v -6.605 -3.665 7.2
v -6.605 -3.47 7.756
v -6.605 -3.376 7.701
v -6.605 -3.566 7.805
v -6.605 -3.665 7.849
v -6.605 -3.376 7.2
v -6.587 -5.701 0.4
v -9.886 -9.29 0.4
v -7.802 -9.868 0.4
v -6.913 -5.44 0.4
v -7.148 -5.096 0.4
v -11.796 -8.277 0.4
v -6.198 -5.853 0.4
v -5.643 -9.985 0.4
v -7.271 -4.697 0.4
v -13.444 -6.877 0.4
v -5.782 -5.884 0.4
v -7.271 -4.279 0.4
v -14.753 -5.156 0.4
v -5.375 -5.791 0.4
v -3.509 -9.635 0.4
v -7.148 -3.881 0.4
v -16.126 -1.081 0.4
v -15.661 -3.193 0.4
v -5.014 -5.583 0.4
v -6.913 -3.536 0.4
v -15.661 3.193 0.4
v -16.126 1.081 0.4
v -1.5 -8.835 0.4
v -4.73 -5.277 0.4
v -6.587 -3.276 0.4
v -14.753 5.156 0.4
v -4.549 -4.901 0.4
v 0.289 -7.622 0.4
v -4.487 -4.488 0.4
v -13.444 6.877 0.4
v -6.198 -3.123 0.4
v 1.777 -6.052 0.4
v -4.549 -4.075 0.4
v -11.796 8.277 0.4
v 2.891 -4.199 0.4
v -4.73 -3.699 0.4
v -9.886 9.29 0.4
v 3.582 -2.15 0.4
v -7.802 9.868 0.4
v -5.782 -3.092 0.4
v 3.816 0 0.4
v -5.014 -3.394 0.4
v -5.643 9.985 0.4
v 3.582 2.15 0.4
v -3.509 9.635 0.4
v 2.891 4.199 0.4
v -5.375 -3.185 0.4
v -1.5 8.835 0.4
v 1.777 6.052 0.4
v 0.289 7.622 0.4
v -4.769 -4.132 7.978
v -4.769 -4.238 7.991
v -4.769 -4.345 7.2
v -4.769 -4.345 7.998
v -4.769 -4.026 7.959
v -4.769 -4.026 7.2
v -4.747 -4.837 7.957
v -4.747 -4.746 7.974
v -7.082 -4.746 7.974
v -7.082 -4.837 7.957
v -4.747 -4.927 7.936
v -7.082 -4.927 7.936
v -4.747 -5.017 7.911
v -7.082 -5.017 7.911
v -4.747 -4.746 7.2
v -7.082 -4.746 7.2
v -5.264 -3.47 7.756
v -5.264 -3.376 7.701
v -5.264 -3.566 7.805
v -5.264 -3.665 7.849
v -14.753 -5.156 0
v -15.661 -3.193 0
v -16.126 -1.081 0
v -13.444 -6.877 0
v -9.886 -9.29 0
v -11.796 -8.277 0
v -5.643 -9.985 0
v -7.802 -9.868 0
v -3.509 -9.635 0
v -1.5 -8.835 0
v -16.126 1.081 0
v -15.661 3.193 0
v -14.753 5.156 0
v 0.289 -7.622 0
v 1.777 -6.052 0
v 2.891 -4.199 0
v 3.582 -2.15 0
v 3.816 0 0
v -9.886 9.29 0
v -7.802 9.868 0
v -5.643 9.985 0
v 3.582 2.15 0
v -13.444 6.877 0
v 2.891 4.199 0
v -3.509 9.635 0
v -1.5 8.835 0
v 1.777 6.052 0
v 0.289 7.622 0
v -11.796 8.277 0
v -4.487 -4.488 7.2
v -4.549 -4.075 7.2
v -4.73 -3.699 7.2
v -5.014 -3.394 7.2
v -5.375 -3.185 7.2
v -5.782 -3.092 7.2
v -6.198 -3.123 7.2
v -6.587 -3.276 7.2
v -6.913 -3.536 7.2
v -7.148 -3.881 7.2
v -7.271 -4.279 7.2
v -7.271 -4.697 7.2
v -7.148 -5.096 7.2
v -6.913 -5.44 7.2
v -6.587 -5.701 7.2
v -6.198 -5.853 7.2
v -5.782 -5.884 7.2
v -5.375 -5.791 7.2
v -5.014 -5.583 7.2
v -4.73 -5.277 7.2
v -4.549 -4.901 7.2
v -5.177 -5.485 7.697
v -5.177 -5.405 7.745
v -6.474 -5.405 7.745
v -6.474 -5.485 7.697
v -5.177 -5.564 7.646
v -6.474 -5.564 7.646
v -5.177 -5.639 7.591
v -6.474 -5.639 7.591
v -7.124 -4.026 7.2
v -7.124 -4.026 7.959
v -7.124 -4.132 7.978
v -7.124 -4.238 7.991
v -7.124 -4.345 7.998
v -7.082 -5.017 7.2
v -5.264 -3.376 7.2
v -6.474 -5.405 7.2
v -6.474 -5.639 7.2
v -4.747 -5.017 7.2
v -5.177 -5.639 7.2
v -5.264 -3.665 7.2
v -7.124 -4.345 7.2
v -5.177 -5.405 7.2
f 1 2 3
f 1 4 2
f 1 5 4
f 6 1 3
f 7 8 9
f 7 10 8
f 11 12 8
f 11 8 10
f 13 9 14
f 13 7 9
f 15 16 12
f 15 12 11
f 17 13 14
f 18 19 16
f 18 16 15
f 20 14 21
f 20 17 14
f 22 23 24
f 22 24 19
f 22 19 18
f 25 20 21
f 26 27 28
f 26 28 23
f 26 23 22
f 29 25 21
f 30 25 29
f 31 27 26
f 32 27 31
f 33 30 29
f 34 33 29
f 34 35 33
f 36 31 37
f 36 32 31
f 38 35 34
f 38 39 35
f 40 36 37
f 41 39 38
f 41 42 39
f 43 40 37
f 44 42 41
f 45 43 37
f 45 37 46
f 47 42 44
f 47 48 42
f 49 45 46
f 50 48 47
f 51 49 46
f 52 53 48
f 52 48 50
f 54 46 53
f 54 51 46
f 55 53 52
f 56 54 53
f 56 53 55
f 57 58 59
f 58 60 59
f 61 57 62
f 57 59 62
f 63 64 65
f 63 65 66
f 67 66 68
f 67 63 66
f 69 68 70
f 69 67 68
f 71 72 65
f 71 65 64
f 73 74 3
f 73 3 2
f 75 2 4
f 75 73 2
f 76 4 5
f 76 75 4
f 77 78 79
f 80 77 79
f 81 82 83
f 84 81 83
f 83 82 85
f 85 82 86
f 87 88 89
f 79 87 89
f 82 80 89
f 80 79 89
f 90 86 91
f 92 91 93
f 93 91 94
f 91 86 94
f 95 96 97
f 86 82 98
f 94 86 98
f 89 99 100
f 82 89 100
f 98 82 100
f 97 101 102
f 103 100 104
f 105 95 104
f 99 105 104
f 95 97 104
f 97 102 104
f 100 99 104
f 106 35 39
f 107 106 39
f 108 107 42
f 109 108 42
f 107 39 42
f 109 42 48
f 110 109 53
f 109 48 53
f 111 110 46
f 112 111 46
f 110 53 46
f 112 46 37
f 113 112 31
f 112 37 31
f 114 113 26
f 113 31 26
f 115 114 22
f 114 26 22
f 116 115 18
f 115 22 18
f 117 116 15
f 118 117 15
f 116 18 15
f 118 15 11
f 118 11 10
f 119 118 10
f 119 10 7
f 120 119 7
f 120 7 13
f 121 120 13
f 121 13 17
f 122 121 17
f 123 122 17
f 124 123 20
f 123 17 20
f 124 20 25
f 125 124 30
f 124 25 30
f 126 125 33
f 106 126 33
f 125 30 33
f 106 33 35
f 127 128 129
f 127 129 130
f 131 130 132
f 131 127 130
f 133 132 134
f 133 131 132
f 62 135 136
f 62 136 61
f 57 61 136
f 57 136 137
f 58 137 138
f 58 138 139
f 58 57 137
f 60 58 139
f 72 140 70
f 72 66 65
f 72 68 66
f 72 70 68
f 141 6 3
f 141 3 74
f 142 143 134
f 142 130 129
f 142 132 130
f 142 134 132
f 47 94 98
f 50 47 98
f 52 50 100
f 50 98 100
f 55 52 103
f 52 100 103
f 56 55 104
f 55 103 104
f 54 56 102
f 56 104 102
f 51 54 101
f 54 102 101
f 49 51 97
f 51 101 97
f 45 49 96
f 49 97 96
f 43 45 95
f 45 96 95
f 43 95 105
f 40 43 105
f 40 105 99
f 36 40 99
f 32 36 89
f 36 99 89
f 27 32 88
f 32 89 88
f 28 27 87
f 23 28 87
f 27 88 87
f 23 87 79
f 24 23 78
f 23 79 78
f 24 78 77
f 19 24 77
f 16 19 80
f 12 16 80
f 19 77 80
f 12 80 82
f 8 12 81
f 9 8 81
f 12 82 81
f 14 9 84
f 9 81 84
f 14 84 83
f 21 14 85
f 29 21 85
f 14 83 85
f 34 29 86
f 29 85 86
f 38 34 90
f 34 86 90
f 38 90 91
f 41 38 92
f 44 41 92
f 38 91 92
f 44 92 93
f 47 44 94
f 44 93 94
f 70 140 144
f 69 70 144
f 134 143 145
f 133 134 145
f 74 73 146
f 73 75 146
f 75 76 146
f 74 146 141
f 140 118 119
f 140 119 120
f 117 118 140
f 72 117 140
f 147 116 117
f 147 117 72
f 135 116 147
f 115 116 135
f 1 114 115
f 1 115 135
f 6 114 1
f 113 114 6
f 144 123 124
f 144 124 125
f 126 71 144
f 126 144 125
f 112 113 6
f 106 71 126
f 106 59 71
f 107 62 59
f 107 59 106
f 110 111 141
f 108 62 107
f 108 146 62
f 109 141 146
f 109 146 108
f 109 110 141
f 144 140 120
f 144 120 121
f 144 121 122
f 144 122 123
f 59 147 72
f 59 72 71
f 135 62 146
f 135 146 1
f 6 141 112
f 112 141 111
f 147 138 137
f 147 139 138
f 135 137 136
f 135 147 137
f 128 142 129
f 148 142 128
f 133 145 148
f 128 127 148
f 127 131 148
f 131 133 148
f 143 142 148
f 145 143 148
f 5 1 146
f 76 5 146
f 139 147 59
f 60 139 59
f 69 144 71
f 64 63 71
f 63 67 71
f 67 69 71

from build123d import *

# Parameters (mm, degrees)
SKETCH1_R                = 10
BOSS_EXTRUDE1_DEPTH      = 0.4
SKETCH2_R                = 1.4
BOSS_EXTRUDE2_DEPTH      = 6.8
BOSS_EXTRUDE4_REACH      = 22.341
BOSS_EXTRUDE4_END_RADIUS = 2
SKETCH5_W                = 1.296800958
SKETCH5_H                = 0.234337446
BOSS_EXTRUDE5_REACH      = 22.341
BOSS_EXTRUDE5_END_RADIUS = 2
SKETCH6_W                = 2.334473836
SKETCH6_H                = 0.270371377
BOSS_EXTRUDE6_REACH      = 22.341
BOSS_EXTRUDE6_END_RADIUS = 2
SKETCH7_W                = 2.355867359
SKETCH7_H                = 0.318641547
BOSS_EXTRUDE7_REACH      = 22.341
BOSS_EXTRUDE7_END_RADIUS = 2
SKETCH8_W                = 1.341324005
SKETCH8_H                = 0.289222795


with BuildPart() as part:
    # Sketch1 → Boss-Extrude1 (new body)
    with BuildSketch(Plane.XY):
        with Locations((-6.184372355, 0)):
            Circle(SKETCH1_R)
    extrude(amount=BOSS_EXTRUDE1_DEPTH)

    # Sketch2 → Boss-Extrude2 (add)
    with BuildSketch(Plane.XY.offset(0.4)):
        with Locations((-5.886934799, -4.488089726)):
            Circle(SKETCH2_R)
    extrude(amount=BOSS_EXTRUDE2_DEPTH)

    # Boss-Extrude5: up to this cylinder (the profile starts inside it)
    boss_extrude5_end = Plane(origin=(-5.914638, -4.427094914, 6), z_dir=(1, 0, 0)) * Cylinder(BOSS_EXTRUDE5_END_RADIUS, 49.682, mode=Mode.PRIVATE)
    # Sketch6 → Boss-Extrude5 (add, up to the surface)
    with BuildSketch(Plane.XY.offset(7.2), mode=Mode.PRIVATE) as boss_extrude5_sk1:
        with Locations((-5.914638283, -4.88134499)):
            Rectangle(SKETCH6_W, SKETCH6_H)
    boss_extrude5_tool1 = extrude(boss_extrude5_sk1.sketch, amount=BOSS_EXTRUDE5_REACH, mode=Mode.PRIVATE) & boss_extrude5_end
    add(boss_extrude5_tool1.solids().sort_by_distance((-5.914638, -4.881345, 7.2))[0])

    # Boss-Extrude6: up to this cylinder (the profile starts inside it)
    boss_extrude6_end = Plane(origin=(-5.946542, -4.427094914, 6), z_dir=(1, 0, 0)) * Cylinder(BOSS_EXTRUDE6_END_RADIUS, 49.682, mode=Mode.PRIVATE)
    # Sketch7 → Boss-Extrude6 (add, up to the surface)
    with BuildSketch(Plane.XY.offset(7.2), mode=Mode.PRIVATE) as boss_extrude6_sk1:
        with Locations((-5.946542218, -4.185509646)):
            Rectangle(SKETCH7_W, SKETCH7_H)
    boss_extrude6_tool1 = extrude(boss_extrude6_sk1.sketch, amount=BOSS_EXTRUDE6_REACH, mode=Mode.PRIVATE) & boss_extrude6_end
    add(boss_extrude6_tool1.solids().sort_by_distance((-5.946542, -4.18551, 7.2))[0])

    # Boss-Extrude7: up to this cylinder (the profile starts inside it)
    boss_extrude7_end = Plane(origin=(-5.934292, -4.427094914, 6), z_dir=(1, 0, 0)) * Cylinder(BOSS_EXTRUDE7_END_RADIUS, 49.682, mode=Mode.PRIVATE)
    # Sketch8 → Boss-Extrude7 (add, up to the surface)
    with BuildSketch(Plane.XY.offset(7.2), mode=Mode.PRIVATE) as boss_extrude7_sk1:
        with Locations((-5.934291899, -3.520470411)):
            Rectangle(SKETCH8_W, SKETCH8_H)
    boss_extrude7_tool1 = extrude(boss_extrude7_sk1.sketch, amount=BOSS_EXTRUDE7_REACH, mode=Mode.PRIVATE) & boss_extrude7_end
    add(boss_extrude7_tool1.solids().sort_by_distance((-5.934292, -3.52047, 7.2))[0])


with BuildPart() as body_2:
    # Boss-Extrude4: up to this cylinder (the profile starts inside it)
    boss_extrude4_end = Plane(origin=(-5.825593, -4.427094914, 6), z_dir=(1, 0, 0)) * Cylinder(BOSS_EXTRUDE4_END_RADIUS, 49.682, mode=Mode.PRIVATE)
    # Sketch5 → Boss-Extrude4 (new, up to the surface)
    with BuildSketch(Plane.XY.offset(7.2), mode=Mode.PRIVATE) as boss_extrude4_sk1:
        with Locations((-5.825593386, -5.522131989)):
            Rectangle(SKETCH5_W, SKETCH5_H)
    boss_extrude4_tool1 = extrude(boss_extrude4_sk1.sketch, amount=BOSS_EXTRUDE4_REACH, mode=Mode.PRIVATE) & boss_extrude4_end
    add(boss_extrude4_tool1.solids().sort_by_distance((-5.825593, -5.522132, 7.2))[0])


solid = Compound([part.part, body_2.part])
